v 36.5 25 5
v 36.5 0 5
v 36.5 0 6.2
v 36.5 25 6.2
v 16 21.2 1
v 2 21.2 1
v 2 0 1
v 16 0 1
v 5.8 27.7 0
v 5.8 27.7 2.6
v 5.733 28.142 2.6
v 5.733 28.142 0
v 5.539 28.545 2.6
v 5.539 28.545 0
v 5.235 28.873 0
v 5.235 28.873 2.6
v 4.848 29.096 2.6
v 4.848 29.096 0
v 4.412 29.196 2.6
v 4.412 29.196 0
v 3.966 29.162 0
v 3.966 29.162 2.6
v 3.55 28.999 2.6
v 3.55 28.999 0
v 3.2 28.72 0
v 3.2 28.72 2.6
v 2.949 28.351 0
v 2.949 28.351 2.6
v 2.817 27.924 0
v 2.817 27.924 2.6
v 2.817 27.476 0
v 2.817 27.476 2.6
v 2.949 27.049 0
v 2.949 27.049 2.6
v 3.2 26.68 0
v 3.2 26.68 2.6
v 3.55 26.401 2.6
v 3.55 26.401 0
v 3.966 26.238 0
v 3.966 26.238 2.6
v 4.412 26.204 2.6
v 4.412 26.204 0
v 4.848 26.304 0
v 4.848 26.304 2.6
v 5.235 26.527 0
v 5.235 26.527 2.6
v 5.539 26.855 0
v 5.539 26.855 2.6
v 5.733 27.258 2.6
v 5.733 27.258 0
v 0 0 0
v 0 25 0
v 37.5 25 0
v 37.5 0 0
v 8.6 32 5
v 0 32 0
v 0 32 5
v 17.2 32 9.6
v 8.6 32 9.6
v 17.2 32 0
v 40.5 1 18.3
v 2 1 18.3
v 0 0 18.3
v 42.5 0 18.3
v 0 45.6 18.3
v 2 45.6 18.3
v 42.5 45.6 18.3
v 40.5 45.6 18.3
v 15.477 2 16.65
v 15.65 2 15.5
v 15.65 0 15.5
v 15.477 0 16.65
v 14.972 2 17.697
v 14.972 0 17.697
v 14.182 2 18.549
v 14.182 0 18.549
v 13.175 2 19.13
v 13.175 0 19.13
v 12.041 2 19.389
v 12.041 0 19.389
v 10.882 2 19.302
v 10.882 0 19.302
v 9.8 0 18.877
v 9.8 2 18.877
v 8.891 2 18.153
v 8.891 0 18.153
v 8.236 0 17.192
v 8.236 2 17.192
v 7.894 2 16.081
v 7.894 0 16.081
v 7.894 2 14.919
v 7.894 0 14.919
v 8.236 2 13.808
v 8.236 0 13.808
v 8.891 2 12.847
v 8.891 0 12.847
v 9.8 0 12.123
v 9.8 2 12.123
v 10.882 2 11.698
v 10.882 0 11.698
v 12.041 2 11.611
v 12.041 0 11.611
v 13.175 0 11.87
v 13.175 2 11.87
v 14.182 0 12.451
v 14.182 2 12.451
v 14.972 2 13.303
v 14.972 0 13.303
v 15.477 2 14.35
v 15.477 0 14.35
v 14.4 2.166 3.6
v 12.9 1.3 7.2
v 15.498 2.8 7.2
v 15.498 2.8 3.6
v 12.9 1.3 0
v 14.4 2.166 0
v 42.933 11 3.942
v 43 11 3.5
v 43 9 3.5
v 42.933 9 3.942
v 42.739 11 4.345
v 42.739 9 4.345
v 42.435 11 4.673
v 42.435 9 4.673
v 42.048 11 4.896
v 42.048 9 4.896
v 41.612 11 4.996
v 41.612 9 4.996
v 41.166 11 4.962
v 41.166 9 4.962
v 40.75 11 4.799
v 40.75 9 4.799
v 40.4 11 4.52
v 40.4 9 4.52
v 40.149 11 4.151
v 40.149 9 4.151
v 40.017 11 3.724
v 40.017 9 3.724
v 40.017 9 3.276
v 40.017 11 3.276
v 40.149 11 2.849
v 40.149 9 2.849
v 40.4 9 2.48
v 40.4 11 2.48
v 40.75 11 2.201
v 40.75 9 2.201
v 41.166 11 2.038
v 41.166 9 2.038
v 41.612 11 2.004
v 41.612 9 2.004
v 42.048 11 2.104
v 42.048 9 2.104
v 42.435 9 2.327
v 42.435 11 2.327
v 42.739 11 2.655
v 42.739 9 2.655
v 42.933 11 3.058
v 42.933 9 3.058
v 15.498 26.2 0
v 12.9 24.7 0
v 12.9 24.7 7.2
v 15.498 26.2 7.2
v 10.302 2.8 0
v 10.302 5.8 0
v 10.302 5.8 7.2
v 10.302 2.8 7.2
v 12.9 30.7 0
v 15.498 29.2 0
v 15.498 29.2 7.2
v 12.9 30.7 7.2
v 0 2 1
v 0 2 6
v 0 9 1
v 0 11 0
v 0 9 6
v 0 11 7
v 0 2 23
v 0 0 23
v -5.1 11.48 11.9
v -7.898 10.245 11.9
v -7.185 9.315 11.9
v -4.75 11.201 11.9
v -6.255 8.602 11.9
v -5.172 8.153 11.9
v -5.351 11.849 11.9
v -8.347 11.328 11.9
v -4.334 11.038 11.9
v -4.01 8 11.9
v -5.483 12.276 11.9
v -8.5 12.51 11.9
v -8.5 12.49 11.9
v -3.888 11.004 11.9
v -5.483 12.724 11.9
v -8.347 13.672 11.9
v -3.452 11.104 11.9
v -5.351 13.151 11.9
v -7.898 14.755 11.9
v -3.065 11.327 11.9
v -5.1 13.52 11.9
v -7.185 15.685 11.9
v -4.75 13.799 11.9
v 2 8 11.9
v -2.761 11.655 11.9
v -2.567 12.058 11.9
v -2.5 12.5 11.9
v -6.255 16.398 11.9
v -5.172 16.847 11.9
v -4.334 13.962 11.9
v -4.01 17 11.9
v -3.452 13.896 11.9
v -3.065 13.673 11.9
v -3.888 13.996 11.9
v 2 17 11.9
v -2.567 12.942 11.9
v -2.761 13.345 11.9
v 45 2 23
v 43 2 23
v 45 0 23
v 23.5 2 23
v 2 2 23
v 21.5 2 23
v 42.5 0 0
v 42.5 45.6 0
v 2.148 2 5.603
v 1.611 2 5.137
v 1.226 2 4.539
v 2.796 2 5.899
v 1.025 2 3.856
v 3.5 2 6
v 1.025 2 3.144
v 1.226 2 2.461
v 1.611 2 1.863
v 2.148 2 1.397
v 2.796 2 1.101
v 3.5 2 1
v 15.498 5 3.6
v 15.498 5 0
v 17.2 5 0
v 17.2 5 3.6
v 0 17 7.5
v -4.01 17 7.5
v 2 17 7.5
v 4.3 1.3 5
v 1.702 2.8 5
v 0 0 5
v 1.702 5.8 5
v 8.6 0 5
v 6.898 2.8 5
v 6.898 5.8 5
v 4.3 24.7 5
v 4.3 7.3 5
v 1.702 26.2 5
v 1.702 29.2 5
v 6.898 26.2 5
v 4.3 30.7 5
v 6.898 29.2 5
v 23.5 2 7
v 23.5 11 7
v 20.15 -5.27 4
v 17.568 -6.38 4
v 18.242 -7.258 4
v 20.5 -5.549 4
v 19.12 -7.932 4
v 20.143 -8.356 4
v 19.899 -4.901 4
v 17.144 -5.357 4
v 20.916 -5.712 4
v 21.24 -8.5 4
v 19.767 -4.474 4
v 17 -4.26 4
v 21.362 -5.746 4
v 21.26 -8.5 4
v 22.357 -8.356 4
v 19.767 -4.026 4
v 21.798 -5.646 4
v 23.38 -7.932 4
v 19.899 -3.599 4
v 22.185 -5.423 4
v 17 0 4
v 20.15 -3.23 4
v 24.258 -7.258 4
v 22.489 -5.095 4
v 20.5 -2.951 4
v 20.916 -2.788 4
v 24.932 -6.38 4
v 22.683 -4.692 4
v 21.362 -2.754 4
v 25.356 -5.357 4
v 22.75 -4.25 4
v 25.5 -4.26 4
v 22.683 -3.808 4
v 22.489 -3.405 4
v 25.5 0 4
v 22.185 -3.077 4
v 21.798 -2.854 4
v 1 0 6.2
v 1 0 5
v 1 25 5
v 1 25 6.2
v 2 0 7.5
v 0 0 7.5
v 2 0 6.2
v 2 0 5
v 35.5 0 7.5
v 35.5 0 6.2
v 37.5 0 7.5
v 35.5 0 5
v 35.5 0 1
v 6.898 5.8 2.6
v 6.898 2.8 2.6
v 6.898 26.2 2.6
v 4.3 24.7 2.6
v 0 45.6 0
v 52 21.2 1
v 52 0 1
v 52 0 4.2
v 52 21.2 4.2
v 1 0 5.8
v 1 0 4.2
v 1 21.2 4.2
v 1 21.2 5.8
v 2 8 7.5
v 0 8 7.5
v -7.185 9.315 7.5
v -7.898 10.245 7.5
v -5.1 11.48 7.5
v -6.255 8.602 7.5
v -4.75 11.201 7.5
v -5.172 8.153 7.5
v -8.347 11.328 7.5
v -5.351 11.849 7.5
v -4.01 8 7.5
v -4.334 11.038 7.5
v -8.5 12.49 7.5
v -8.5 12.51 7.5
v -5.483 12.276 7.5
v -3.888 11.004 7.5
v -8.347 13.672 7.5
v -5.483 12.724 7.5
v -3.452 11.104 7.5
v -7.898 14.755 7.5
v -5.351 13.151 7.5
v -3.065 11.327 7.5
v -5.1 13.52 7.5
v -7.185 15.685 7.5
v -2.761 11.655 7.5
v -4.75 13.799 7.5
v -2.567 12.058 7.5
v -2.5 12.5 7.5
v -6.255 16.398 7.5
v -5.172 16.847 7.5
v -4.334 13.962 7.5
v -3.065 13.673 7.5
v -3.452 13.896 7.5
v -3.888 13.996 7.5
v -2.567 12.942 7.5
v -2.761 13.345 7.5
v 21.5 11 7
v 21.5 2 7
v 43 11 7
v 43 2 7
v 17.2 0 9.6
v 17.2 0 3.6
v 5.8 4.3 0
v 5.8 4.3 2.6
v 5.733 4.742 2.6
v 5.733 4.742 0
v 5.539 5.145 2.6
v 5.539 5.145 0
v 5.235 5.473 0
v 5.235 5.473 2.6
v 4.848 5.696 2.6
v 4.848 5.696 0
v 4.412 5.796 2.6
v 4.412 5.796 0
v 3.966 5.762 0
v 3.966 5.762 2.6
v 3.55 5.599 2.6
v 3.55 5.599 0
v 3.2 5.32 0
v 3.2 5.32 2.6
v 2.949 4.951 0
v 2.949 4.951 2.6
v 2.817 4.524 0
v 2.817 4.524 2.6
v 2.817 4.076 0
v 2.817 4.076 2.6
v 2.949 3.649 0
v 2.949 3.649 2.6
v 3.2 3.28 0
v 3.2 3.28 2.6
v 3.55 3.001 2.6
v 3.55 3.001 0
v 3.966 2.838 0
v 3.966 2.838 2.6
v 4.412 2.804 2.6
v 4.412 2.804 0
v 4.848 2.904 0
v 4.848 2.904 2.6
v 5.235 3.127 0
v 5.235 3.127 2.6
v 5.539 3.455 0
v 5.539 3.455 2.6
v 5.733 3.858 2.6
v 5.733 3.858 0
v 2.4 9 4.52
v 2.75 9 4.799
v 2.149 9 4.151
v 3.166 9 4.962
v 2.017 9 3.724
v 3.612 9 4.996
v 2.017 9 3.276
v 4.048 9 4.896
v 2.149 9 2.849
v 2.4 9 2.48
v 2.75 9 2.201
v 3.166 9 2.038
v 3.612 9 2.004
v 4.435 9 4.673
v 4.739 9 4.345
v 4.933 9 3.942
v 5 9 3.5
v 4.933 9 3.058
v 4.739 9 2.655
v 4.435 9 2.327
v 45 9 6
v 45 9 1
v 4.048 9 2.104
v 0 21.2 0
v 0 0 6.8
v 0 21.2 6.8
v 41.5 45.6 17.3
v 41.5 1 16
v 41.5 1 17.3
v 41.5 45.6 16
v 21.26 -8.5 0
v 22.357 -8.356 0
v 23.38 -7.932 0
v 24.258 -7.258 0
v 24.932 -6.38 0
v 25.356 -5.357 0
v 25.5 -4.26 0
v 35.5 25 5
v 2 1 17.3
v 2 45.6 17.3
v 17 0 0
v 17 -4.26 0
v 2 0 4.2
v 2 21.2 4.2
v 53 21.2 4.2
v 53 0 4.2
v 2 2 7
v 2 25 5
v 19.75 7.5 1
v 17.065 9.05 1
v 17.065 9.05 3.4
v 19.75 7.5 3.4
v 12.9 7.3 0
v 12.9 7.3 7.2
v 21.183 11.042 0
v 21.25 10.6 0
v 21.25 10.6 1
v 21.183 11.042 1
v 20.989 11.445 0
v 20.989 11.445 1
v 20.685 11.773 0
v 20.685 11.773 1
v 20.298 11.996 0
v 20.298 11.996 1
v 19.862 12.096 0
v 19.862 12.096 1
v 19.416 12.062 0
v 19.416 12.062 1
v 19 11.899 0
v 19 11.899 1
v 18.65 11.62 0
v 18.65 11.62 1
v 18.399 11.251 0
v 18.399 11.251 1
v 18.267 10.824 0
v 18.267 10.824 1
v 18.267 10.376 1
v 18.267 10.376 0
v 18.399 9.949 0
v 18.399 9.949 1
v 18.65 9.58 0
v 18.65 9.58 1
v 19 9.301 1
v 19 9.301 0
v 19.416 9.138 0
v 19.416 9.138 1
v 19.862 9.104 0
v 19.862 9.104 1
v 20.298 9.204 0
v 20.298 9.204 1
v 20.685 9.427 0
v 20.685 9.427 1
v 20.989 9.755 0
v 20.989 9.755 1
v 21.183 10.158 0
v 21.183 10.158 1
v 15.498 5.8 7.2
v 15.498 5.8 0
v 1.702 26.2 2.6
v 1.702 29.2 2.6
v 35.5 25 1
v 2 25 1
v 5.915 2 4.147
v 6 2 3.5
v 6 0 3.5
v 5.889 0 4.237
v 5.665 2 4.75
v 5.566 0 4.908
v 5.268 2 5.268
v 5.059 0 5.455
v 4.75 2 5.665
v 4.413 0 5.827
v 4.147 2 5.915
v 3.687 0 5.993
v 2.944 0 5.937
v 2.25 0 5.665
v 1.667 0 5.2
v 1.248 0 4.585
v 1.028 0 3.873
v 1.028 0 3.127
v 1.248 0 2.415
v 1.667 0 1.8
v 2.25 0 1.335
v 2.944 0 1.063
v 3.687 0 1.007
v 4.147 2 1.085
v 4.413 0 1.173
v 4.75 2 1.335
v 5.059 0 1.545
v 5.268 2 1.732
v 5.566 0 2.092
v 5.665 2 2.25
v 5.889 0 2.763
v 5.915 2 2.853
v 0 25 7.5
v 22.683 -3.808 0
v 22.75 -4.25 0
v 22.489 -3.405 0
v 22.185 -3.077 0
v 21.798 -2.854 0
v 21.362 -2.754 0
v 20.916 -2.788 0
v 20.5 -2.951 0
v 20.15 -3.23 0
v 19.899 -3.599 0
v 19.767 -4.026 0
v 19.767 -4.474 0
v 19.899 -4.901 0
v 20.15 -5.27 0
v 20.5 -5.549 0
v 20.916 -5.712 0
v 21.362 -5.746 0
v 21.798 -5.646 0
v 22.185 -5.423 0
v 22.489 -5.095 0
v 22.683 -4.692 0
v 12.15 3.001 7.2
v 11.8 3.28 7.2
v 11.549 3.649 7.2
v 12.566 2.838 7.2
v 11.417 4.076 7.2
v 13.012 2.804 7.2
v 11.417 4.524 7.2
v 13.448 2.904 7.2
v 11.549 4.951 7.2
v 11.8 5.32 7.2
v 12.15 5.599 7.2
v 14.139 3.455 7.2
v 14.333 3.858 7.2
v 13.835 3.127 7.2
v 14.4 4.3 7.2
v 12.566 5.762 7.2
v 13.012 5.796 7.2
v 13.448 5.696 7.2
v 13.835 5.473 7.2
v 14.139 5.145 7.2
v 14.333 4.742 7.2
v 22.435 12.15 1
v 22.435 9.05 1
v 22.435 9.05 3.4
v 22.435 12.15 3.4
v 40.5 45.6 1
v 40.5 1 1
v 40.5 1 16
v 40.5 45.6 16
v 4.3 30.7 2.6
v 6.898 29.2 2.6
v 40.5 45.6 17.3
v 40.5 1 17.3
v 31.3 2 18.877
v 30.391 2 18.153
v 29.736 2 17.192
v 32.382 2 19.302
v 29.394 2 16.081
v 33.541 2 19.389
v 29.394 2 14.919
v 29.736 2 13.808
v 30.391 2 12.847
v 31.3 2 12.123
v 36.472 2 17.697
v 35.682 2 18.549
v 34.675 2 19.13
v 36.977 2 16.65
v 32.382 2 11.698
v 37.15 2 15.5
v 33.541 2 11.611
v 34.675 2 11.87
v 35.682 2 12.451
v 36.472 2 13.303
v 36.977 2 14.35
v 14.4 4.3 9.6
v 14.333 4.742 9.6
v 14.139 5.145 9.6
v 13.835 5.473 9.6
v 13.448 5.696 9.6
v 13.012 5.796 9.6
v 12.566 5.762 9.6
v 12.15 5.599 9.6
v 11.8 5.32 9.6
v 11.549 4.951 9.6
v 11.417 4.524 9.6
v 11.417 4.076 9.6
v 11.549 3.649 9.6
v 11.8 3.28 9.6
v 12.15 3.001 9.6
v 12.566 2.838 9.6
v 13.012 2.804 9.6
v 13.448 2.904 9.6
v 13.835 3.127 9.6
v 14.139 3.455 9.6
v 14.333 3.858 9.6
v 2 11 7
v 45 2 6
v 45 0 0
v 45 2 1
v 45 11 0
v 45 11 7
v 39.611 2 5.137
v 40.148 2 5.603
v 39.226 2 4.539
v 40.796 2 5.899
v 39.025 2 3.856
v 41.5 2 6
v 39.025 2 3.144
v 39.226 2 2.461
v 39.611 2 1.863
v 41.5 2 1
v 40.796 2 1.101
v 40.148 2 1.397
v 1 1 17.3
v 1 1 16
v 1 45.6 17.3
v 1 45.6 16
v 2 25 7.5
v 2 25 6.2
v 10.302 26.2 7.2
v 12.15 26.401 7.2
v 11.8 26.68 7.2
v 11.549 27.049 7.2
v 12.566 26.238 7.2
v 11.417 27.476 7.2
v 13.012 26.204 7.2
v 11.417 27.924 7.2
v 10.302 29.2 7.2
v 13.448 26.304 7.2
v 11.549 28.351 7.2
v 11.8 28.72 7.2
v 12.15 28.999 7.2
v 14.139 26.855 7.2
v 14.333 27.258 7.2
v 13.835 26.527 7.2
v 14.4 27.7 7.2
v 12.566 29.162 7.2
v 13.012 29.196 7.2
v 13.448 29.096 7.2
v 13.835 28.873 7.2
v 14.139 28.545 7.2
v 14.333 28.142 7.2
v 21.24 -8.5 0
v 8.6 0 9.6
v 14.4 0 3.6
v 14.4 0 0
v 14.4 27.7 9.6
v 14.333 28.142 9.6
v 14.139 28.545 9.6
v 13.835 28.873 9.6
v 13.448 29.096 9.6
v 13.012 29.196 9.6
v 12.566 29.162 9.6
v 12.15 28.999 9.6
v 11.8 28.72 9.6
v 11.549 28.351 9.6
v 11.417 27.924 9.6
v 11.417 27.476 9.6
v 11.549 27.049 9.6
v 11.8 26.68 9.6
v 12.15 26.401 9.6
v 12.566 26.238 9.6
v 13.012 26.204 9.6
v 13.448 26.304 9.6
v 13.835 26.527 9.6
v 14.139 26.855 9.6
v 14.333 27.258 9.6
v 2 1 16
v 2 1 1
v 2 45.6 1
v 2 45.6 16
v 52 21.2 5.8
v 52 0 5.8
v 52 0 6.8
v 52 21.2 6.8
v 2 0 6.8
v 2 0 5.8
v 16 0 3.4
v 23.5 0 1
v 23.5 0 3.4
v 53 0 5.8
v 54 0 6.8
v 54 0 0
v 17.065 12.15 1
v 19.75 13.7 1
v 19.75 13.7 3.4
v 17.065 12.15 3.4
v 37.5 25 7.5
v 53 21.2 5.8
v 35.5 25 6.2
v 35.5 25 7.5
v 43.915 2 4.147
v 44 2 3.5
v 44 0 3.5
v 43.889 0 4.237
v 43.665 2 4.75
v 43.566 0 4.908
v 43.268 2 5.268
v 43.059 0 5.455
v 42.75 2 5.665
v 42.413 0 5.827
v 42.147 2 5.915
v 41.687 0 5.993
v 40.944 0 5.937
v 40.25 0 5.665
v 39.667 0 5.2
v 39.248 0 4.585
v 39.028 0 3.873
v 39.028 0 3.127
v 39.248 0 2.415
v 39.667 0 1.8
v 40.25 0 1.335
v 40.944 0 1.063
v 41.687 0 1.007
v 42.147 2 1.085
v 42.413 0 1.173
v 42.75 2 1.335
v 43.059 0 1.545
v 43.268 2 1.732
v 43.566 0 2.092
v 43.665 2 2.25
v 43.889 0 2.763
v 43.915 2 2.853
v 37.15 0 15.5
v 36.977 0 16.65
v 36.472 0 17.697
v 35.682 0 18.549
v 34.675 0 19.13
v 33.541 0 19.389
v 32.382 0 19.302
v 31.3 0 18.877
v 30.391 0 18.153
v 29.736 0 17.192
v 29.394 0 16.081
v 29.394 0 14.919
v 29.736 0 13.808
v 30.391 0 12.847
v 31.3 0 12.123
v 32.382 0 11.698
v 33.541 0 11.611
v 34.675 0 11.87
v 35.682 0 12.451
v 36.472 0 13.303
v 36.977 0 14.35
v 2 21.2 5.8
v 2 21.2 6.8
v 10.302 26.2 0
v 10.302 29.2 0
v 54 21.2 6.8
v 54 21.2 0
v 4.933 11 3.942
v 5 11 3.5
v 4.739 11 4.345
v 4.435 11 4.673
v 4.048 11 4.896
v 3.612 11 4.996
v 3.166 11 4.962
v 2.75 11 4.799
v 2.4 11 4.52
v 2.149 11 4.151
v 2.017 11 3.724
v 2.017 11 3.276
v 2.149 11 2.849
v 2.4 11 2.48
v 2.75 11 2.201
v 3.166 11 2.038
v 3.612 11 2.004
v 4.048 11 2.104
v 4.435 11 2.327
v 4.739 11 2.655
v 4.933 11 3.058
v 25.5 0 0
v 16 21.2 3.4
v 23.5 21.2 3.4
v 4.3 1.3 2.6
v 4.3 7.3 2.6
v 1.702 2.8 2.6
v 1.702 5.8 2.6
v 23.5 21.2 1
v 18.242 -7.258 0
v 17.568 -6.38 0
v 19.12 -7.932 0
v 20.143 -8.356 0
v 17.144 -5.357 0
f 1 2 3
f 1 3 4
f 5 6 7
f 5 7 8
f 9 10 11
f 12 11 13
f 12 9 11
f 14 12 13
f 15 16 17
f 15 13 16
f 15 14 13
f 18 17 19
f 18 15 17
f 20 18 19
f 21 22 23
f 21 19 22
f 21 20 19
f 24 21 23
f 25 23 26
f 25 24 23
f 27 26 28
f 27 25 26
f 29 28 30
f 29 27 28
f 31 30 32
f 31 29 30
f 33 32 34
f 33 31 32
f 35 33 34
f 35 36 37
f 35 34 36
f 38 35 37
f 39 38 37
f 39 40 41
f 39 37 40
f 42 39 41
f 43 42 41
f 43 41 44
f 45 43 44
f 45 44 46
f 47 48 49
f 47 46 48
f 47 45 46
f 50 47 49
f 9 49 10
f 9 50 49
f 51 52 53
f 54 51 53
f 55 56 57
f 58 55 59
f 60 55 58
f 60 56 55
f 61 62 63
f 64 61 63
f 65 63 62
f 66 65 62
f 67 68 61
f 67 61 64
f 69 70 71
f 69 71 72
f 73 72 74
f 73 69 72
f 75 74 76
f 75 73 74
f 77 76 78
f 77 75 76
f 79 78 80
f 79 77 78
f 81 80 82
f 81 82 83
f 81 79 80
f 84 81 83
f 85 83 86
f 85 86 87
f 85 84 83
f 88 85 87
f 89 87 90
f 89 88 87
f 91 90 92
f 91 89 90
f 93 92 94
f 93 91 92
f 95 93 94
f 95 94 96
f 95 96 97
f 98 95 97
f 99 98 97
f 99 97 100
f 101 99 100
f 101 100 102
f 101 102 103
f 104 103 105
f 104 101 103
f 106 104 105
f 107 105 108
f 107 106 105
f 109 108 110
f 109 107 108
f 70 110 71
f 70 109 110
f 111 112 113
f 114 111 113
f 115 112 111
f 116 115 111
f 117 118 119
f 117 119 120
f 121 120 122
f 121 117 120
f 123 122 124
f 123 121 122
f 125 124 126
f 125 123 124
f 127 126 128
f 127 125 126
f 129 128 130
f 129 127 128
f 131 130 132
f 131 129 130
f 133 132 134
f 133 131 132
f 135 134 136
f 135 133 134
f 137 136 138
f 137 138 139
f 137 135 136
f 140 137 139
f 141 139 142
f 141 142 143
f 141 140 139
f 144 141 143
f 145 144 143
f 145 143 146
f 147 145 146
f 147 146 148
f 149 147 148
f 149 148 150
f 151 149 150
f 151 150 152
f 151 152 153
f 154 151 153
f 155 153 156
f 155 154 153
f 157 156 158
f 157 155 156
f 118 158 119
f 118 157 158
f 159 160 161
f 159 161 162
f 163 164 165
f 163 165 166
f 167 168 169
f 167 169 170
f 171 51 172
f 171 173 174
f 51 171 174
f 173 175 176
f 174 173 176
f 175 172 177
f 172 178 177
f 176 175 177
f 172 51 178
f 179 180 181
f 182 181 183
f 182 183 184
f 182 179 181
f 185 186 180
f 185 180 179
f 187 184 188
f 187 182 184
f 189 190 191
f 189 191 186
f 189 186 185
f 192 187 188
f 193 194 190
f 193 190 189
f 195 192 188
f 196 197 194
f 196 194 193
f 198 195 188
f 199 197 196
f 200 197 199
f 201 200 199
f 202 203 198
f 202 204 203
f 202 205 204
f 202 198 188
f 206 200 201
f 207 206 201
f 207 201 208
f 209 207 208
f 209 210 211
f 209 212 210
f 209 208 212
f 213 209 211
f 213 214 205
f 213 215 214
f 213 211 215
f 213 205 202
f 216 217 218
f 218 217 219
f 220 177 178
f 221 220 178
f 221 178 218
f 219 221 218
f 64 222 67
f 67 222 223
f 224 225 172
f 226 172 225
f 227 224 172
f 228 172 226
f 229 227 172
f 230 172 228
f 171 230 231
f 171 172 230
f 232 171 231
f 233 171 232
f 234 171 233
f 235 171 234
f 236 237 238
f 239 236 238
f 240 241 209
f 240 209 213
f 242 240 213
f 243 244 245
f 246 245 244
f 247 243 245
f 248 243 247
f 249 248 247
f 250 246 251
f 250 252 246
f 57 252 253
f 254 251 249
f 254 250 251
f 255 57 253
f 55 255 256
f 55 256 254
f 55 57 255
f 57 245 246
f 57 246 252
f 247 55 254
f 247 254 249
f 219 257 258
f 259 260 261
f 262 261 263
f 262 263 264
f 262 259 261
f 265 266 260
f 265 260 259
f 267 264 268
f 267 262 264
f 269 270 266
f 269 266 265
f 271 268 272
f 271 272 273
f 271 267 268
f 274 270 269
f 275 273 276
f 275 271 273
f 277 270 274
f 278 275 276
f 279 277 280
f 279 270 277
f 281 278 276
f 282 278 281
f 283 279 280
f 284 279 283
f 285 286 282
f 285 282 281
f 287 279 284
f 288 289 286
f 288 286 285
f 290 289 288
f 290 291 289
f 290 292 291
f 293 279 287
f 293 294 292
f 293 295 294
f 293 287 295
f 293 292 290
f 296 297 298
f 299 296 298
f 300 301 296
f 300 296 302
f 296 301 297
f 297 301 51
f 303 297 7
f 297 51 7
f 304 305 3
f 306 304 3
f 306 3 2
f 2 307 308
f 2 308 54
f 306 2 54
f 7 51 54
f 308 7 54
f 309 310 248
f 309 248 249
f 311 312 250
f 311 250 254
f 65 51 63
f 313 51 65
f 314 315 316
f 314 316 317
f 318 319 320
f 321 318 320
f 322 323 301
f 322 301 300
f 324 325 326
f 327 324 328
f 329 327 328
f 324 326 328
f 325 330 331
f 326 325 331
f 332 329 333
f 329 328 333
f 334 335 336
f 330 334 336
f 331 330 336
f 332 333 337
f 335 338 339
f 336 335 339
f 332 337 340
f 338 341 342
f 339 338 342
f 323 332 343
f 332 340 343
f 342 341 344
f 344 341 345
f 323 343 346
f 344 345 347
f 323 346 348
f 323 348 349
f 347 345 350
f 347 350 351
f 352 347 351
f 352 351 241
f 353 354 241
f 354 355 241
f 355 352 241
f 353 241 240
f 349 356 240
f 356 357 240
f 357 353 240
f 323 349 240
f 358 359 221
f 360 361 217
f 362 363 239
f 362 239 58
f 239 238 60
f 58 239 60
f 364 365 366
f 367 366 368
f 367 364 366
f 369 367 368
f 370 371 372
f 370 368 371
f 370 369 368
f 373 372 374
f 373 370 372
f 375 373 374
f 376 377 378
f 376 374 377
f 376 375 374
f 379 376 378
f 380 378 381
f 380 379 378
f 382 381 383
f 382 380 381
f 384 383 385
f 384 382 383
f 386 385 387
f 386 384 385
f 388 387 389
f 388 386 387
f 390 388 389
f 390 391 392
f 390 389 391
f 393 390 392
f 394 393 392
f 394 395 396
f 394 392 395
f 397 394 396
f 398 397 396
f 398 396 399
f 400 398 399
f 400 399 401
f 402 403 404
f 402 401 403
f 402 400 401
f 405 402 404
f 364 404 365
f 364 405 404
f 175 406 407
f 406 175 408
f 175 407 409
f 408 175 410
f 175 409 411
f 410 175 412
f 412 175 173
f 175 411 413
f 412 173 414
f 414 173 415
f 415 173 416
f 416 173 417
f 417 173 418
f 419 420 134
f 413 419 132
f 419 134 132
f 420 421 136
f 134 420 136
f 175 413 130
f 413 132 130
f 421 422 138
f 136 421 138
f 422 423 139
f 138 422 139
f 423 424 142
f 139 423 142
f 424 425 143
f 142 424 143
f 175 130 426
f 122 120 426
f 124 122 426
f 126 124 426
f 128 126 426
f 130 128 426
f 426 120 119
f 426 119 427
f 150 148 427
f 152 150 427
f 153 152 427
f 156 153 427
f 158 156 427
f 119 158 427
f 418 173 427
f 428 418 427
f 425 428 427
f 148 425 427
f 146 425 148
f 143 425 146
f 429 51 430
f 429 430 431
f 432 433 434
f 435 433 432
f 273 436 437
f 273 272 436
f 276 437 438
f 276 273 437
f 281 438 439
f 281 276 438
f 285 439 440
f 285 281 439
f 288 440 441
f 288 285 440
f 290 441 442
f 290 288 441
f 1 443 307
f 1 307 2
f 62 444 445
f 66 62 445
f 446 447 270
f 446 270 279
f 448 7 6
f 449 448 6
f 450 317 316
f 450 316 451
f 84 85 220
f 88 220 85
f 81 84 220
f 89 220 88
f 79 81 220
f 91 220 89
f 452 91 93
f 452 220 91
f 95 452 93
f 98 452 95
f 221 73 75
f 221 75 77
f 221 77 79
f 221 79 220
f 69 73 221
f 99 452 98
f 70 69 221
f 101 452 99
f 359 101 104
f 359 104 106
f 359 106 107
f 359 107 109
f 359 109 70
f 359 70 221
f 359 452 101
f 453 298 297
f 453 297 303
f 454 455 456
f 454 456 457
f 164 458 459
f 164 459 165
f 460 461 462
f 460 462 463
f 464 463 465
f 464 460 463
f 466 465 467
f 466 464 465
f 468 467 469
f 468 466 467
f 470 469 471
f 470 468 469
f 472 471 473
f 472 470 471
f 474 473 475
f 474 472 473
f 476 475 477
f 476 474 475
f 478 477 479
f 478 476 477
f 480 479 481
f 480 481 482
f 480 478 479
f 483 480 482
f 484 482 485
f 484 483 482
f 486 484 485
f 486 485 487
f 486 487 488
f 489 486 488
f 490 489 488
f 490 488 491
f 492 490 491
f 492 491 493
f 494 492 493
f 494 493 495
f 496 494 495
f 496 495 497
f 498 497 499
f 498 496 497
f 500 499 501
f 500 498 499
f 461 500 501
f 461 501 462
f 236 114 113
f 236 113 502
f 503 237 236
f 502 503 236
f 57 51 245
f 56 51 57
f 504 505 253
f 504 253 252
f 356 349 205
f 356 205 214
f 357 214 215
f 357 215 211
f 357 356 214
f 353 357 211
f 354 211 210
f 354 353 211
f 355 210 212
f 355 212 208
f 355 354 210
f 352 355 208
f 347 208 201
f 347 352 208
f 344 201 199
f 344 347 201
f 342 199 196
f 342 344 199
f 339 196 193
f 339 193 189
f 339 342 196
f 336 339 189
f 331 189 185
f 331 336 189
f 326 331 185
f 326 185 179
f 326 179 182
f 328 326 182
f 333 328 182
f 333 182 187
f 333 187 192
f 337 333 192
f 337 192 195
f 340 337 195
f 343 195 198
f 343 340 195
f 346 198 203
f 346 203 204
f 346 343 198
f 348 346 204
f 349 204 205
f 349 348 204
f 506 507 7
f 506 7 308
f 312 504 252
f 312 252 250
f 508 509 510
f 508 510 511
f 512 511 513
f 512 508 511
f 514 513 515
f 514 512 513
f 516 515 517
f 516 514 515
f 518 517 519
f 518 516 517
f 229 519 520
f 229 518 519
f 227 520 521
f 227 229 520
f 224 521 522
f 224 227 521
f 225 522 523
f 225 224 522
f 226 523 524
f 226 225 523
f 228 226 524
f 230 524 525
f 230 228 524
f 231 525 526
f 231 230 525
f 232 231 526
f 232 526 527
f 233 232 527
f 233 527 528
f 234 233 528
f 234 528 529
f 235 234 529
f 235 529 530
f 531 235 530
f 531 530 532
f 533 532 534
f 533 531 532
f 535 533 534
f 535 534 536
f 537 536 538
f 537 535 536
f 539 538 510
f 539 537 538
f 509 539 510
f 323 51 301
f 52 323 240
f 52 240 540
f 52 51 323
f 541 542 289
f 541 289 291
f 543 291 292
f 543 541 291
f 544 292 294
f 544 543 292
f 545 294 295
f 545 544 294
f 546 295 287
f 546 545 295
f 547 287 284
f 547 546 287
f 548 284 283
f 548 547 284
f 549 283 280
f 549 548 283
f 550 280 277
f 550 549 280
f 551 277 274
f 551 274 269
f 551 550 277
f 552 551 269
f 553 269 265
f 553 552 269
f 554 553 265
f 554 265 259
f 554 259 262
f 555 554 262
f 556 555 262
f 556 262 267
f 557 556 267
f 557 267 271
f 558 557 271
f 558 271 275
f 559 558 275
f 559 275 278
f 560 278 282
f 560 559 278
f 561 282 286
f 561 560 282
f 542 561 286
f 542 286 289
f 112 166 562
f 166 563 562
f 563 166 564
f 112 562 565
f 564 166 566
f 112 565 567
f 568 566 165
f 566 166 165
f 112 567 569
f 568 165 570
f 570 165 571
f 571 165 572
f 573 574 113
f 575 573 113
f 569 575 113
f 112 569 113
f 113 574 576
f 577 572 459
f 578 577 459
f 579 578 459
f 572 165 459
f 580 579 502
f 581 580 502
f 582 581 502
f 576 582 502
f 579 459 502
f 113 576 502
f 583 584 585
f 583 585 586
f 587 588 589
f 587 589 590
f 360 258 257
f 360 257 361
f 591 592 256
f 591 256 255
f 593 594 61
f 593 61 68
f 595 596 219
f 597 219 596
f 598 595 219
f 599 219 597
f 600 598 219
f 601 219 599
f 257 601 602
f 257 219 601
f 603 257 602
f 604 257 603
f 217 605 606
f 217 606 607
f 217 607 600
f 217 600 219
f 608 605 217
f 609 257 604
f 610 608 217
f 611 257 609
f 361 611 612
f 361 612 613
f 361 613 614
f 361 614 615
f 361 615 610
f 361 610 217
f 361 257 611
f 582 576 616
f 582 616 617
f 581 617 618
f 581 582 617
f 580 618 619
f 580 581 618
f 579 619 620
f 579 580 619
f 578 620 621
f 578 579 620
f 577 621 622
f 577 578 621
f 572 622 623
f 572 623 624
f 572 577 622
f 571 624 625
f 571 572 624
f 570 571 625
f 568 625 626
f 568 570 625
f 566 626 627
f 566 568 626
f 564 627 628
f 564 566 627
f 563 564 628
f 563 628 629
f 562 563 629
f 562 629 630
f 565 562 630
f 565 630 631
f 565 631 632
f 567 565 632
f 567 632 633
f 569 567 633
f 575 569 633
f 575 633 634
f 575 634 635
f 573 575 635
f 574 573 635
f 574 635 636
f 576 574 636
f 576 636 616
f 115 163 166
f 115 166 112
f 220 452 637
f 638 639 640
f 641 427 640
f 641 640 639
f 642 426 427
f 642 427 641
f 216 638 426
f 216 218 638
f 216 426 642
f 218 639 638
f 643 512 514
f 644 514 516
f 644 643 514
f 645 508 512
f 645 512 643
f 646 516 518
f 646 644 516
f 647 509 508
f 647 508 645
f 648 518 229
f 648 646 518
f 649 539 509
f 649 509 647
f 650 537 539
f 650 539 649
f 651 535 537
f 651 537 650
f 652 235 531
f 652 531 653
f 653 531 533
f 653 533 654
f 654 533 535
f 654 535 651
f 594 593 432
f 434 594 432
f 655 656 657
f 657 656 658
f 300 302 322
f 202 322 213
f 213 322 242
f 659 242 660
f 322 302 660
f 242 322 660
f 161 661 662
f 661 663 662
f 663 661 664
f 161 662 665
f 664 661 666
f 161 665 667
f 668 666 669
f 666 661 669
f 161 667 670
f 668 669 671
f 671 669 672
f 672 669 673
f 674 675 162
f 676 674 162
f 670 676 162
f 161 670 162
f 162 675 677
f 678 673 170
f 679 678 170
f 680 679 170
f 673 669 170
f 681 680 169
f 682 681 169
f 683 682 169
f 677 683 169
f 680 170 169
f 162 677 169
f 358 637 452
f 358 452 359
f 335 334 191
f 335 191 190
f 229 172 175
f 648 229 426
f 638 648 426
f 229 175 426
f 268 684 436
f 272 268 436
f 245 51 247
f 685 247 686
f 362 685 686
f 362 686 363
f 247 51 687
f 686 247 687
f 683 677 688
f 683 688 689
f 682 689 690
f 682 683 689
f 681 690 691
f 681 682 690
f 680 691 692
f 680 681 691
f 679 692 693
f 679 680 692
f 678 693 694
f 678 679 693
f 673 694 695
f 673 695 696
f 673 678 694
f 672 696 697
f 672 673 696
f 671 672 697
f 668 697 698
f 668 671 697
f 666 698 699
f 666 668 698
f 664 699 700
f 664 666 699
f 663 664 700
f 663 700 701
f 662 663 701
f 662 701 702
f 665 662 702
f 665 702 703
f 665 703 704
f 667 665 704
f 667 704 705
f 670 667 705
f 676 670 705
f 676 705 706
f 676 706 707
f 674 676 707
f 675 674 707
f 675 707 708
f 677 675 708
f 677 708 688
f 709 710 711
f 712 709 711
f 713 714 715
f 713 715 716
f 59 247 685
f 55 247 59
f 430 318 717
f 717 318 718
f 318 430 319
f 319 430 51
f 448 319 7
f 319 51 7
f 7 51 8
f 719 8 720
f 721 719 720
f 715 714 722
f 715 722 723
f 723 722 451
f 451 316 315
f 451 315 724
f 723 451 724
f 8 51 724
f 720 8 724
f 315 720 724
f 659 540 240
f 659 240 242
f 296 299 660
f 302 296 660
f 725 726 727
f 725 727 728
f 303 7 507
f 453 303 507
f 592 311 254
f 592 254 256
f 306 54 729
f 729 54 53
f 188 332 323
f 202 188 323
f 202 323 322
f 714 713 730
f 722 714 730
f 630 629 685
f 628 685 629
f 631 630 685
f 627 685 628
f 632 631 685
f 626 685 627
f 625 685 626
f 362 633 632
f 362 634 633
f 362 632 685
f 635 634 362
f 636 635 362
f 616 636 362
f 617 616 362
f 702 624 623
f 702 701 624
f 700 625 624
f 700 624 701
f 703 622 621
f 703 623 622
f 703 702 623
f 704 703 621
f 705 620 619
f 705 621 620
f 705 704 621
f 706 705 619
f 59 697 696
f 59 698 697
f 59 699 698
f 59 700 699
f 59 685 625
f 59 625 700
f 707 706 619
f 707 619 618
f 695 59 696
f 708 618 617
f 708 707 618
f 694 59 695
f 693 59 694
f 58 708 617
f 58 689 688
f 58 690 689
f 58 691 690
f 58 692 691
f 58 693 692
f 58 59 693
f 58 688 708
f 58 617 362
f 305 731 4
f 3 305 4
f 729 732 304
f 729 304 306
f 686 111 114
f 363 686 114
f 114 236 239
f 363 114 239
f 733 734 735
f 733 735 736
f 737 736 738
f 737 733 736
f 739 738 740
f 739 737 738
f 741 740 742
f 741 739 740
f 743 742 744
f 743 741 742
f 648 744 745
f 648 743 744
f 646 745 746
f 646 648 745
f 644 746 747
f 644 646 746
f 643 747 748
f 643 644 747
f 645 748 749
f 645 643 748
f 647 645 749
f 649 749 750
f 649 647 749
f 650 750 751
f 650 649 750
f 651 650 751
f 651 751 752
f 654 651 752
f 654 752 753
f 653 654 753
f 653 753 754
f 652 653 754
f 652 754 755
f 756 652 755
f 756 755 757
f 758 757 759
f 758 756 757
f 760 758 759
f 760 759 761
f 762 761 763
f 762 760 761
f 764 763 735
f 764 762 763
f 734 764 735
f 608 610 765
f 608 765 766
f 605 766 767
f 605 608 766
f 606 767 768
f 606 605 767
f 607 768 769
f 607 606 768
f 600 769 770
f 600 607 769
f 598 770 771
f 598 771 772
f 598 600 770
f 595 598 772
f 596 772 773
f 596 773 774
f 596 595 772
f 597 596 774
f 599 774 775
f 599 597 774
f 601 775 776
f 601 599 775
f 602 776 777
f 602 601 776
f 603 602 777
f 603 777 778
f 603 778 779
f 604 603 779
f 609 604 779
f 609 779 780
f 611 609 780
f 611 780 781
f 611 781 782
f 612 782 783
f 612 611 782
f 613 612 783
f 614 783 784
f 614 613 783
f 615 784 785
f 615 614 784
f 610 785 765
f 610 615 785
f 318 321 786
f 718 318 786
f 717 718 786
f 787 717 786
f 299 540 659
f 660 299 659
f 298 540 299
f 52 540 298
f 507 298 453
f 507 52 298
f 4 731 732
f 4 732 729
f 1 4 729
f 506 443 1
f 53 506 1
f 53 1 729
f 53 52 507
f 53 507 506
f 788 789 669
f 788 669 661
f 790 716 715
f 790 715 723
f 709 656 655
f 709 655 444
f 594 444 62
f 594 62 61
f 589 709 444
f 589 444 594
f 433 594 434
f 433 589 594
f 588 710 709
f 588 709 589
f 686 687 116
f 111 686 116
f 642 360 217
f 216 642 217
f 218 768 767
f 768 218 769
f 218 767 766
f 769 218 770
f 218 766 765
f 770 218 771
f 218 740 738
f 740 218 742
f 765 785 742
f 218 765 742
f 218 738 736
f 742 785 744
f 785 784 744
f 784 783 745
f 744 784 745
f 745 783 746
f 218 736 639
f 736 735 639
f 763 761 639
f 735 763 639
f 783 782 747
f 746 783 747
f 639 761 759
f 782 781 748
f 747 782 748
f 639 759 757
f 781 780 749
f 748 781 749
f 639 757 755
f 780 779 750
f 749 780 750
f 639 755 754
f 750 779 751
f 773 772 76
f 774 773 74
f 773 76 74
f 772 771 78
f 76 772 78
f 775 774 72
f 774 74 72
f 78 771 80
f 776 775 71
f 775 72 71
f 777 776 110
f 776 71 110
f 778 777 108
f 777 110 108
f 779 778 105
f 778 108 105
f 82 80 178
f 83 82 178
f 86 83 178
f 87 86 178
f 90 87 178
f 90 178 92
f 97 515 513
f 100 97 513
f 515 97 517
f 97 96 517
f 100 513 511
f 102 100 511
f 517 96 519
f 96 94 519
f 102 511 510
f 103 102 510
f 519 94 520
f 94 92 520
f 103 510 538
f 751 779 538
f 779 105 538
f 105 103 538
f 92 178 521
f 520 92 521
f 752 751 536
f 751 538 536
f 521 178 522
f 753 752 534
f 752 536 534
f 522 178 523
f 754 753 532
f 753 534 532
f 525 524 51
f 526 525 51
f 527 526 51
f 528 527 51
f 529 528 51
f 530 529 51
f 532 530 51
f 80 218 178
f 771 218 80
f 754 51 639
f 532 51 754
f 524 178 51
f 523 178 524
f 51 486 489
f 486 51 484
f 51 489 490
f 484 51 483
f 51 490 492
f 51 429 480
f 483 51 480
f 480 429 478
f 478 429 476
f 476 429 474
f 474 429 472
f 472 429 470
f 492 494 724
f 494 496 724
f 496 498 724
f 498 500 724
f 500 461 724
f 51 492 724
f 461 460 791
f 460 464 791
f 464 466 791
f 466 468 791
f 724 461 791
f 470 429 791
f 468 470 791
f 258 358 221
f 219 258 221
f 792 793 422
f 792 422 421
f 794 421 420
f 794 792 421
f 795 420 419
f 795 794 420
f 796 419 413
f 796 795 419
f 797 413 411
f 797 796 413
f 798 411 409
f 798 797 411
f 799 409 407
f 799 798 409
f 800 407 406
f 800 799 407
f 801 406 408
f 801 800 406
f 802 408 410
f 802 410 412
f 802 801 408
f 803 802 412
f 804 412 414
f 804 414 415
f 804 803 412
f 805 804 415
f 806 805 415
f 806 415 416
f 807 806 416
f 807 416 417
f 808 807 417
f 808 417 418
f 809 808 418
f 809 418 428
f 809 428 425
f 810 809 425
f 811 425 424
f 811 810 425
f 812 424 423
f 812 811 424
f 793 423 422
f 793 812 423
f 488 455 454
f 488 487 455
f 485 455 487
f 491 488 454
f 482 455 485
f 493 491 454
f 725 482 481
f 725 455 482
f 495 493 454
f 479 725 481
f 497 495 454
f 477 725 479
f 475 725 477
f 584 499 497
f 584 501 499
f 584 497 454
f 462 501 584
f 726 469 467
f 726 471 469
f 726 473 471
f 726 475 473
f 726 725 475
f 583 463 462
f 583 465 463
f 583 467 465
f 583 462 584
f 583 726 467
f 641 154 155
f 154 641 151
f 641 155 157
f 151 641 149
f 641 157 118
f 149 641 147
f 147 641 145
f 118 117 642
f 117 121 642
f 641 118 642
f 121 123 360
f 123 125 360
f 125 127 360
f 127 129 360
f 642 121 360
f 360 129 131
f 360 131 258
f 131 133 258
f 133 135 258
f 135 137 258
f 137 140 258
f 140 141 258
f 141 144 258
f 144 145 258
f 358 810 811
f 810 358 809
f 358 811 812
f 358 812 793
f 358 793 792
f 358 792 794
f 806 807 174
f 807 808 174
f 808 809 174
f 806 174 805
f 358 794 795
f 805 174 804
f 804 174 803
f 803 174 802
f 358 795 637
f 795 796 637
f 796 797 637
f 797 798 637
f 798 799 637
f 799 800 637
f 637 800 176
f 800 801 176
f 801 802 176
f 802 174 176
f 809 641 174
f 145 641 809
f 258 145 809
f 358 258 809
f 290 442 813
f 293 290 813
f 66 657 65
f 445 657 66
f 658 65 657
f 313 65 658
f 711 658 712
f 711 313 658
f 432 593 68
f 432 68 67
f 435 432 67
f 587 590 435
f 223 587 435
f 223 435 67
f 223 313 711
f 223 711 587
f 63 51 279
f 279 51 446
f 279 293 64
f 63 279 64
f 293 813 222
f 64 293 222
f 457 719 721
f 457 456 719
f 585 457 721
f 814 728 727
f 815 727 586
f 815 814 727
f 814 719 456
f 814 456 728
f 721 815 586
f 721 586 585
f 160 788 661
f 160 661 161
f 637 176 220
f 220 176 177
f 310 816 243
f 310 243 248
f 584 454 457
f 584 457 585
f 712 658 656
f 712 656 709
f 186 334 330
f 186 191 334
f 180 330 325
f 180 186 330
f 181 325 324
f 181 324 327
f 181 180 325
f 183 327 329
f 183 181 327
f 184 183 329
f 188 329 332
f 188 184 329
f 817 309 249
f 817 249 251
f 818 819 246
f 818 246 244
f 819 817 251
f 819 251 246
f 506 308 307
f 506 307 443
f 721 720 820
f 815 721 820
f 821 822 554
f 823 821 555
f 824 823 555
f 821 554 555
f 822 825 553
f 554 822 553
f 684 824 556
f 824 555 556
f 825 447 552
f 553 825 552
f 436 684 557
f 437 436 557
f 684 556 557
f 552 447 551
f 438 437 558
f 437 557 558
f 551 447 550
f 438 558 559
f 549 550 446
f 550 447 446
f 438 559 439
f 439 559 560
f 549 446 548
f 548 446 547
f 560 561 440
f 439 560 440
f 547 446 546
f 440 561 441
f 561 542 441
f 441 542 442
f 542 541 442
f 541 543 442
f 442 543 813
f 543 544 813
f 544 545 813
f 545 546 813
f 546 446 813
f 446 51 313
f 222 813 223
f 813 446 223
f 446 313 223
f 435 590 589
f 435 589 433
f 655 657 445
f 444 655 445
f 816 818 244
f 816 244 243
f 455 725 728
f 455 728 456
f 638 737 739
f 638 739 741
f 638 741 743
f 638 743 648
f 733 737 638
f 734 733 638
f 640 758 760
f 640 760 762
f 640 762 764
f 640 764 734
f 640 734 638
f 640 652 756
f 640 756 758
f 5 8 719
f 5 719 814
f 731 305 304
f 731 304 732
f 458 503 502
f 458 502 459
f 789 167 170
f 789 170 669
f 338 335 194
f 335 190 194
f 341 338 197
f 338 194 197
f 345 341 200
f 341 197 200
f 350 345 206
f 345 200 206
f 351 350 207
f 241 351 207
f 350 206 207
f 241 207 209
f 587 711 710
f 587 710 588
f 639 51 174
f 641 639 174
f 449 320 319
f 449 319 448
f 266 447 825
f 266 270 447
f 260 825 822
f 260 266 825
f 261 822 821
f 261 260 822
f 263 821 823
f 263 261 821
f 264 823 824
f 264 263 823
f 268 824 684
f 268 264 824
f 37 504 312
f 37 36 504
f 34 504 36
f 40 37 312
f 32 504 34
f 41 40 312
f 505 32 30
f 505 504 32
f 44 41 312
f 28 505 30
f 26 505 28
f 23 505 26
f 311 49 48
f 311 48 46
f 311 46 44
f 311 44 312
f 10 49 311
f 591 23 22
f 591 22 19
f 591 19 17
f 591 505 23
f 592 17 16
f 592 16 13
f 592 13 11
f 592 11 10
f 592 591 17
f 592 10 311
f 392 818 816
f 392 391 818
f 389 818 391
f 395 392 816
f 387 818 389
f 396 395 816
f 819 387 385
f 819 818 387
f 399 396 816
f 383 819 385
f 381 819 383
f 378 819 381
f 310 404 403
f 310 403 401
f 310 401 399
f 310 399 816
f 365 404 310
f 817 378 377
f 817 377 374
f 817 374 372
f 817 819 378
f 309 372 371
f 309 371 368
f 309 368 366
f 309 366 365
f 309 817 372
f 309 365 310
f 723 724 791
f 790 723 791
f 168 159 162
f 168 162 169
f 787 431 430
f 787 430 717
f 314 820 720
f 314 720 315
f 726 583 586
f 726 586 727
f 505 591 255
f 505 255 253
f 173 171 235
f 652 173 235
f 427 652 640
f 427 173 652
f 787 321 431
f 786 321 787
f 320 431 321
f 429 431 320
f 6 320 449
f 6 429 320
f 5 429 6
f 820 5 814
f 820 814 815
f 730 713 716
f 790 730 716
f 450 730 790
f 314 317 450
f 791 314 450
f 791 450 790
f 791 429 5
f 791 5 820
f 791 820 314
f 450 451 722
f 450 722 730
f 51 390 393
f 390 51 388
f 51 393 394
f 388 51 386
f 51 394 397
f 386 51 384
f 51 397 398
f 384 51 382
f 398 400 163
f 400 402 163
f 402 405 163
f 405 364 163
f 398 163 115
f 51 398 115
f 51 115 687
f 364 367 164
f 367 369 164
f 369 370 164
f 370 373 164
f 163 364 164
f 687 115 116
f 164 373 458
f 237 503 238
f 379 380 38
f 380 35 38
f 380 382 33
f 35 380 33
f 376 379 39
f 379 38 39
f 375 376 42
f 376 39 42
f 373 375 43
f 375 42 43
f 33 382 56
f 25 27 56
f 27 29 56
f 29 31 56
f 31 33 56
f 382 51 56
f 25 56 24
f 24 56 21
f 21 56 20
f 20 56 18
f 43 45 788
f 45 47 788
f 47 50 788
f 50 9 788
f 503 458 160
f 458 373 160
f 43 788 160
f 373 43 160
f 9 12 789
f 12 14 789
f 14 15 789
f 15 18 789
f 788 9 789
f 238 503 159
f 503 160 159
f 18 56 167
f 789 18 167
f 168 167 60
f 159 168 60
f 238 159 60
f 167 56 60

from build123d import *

# Parameters (mm, degrees)
PAD003_DEPTH      = 7.2
PAD002_DEPTH      = 7.2
PAD001_DEPTH      = 2.4
PAD_DEPTH         = 2.4
CYLINDER003_R     = 1.5
CYLINDER003_DEPTH = 5
CYLINDER002_R     = 1.5
CYLINDER002_DEPTH = 5
CYLINDER001_R     = 1.5
CYLINDER001_DEPTH = 9.6
CYLINDER_R        = 1.5
CYLINDER_DEPTH    = 9.6
BOX002_W          = 8.6
BOX002_H          = 32
BOX002_DEPTH      = 4.6
BOX001_W          = 2.8
BOX001_H          = 5
BOX001_DEPTH      = 3.6
BOX_W             = 17.2
BOX_H             = 32
BOX_DEPTH         = 9.6
CYLINDER004_R     = 1.5
CYLINDER004_DEPTH = 4.4
BOX006_W          = 10.5
BOX006_H          = 9
BOX006_DEPTH      = 4.4
FILLET_R          = 4.49
BOX005_W          = 35.5
BOX005_H          = 25
BOX005_DEPTH      = 1.2
BOX003_W          = 33.5
BOX003_H          = 25
BOX003_DEPTH      = 6.5
BOX004_W          = 37.5
BOX004_H          = 25
BOX004_DEPTH      = 7.5
CYLINDER005_R     = 1.5
CYLINDER005_DEPTH = 1
PAD004_DEPTH      = 2.4
BOX010_W          = 7.5
BOX010_H          = 21.2
BOX010_DEPTH      = 2.4
BOX009_W          = 52
BOX009_H          = 21.2
BOX009_DEPTH      = 1.6
BOX008_W          = 50
BOX008_H          = 21.2
BOX008_DEPTH      = 5.8
BOX007_W          = 54
BOX007_H          = 21.2
BOX007_DEPTH      = 6.8
CYLINDER011_R     = 3.9
CYLINDER011_DEPTH = 2
CYLINDER010_R     = 3.9
CYLINDER010_DEPTH = 2
CYLINDER009_R     = 1.5
CYLINDER009_DEPTH = 2
CYLINDER008_R     = 2.5
CYLINDER008_DEPTH = 2
CYLINDER007_R     = 1.5
CYLINDER007_DEPTH = 2
CYLINDER006_R     = 2.5
CYLINDER006_DEPTH = 2
BOX013_W          = 19.5
BOX013_H          = 9
BOX013_DEPTH      = 16
BOX012_W          = 19.5
BOX012_H          = 9
BOX012_DEPTH      = 16
BOX011_W          = 45
BOX011_H          = 7
BOX011_DEPTH      = 5
PAD005_DEPTH      = 45
CYLINDER012_R     = 1.5
CYLINDER012_DEPTH = 4
BOX017_W          = 8.5
BOX017_H          = 8.5
BOX017_DEPTH      = 4
FILLET001_R       = 4.24
BOX016_W          = 40.5
BOX016_H          = 44.6
BOX016_DEPTH      = 1.3
BOX015_W          = 38.5
BOX015_H          = 44.6
BOX015_DEPTH      = 18.3
BOX014_W          = 42.5
BOX014_H          = 45.6
BOX014_DEPTH      = 18.3


with BuildPart() as nut_hole003:
    # Sketch003 → Pad003 (new body)
    with BuildSketch(Plane.XY):
        Polygon((0, 3), (-2.598076, 1.5), (-2.598076, -1.5), (0, -3), (2.598076, -1.5), (2.598076, 1.5), align=None)
    extrude(amount=PAD003_DEPTH)


with BuildPart() as nut_hole003_1:
    # Body003 placement: moved
    add(nut_hole003.part.moved(Location((12.9, 4.3, 0))))


with BuildPart() as nut_hole002:
    # Sketch002 → Pad002 (new body)
    with BuildSketch(Plane.XY):
        Polygon((0, 3), (-2.598076, 1.5), (-2.598076, -1.5), (0, -3), (2.598076, -1.5), (2.598076, 1.5), align=None)
    extrude(amount=PAD002_DEPTH)


with BuildPart() as nut_hole002_1:
    # Body002 placement: moved
    add(nut_hole002.part.moved(Location((12.9, 27.7, 0))))


with BuildPart() as nut_hole001:
    # Sketch001 → Pad001 (new body)
    with BuildSketch(Plane.XY):
        Polygon((0, 3), (-2.598076, 1.5), (-2.598076, -1.5), (0, -3), (2.598076, -1.5), (2.598076, 1.5), align=None)
    extrude(amount=PAD001_DEPTH)


with BuildPart() as nut_hole001_1:
    # Body001 placement: moved
    add(nut_hole001.part.moved(Location((4.3, 27.7, 2.6))))


with BuildPart() as nut_hole:
    # Sketch → Pad (new body)
    with BuildSketch(Plane.XY):
        Polygon((0, 3), (-2.598076, 1.5), (-2.598076, -1.5), (0, -3), (2.598076, -1.5), (2.598076, 1.5), align=None)
    extrude(amount=PAD_DEPTH)


with BuildPart() as nut_hole_1:
    # Body placement: moved
    add(nut_hole.part.moved(Location((4.3, 4.3, 2.6))))


with BuildPart() as screw_hole003:
    # Cylinder003 → Cylinder003 (new body)
    with BuildSketch(Plane(origin=(4.3, 27.7, 0), x_dir=(1, 0, 0), z_dir=(0, 0, 1))):
        Circle(CYLINDER003_R)
    extrude(amount=CYLINDER003_DEPTH)


with BuildPart() as screw_hole002:
    # Cylinder002 → Cylinder002 (new body)
    with BuildSketch(Plane(origin=(4.3, 4.3, 0), x_dir=(1, 0, 0), z_dir=(0, 0, 1))):
        Circle(CYLINDER002_R)
    extrude(amount=CYLINDER002_DEPTH)


with BuildPart() as screw_hole001:
    # Cylinder001 → Cylinder001 (new body)
    with BuildSketch(Plane(origin=(12.9, 27.7, 0), x_dir=(1, 0, 0), z_dir=(0, 0, 1))):
        Circle(CYLINDER001_R)
    extrude(amount=CYLINDER001_DEPTH)


with BuildPart() as screw_hole:
    # Cylinder → Cylinder (new body)
    with BuildSketch(Plane(origin=(12.9, 4.3, 0), x_dir=(1, 0, 0), z_dir=(0, 0, 1))):
        Circle(CYLINDER_R)
    extrude(amount=CYLINDER_DEPTH)


with BuildPart() as hole:
    # Box002 → Box002 (new body)
    with BuildSketch(Plane.XY.offset(5)):
        with Locations((4.3, 16)):
            Rectangle(BOX002_W, BOX002_H)
    extrude(amount=BOX002_DEPTH)


with BuildPart() as corner_hole:
    # Box001 → Box001 (new body)
    with BuildSketch(Plane(origin=(14.4, 0, 0), x_dir=(1, 0, 0), z_dir=(0, 0, 1))):
        with Locations((1.4, 2.5)):
            Rectangle(BOX001_W, BOX001_H)
    extrude(amount=BOX001_DEPTH)


with BuildPart() as right_support:
    # Box → Box (new body)
    with BuildSketch(Plane.XY):
        with Locations((8.6, 16)):
            Rectangle(BOX_W, BOX_H)
    extrude(amount=BOX_DEPTH)

    # Cut: cut corner_hole
    add(corner_hole.part, mode=Mode.SUBTRACT)

    # Cut001: cut hole
    add(hole.part, mode=Mode.SUBTRACT)

    # Cut002: cut screw_hole
    add(screw_hole.part, mode=Mode.SUBTRACT)

    # Cut003: cut screw_hole001
    add(screw_hole001.part, mode=Mode.SUBTRACT)

    # Cut004: cut screw_hole002
    add(screw_hole002.part, mode=Mode.SUBTRACT)

    # Cut005: cut screw_hole003
    add(screw_hole003.part, mode=Mode.SUBTRACT)

    # Cut006: cut nut_hole
    add(nut_hole_1.part, mode=Mode.SUBTRACT)

    # Cut007: cut nut_hole001
    add(nut_hole001_1.part, mode=Mode.SUBTRACT)

    # Cut008: cut nut_hole002
    add(nut_hole002_1.part, mode=Mode.SUBTRACT)

    # Cut009: cut nut_hole003
    add(nut_hole003_1.part, mode=Mode.SUBTRACT)


with BuildPart() as screw_hole004:
    # Cylinder004 → Cylinder004 (new body)
    with BuildSketch(Plane(origin=(-4, 12.5, 7.5), x_dir=(1, 0, 0), z_dir=(0, 0, 1))):
        Circle(CYLINDER004_R)
    extrude(amount=CYLINDER004_DEPTH)


with BuildPart() as support001:
    # Box006 → Box006 (new body)
    with BuildSketch(Plane(origin=(-8.5, 8, 7.5), x_dir=(1, 0, 0), z_dir=(0, 0, 1))):
        with Locations((5.25, 4.5)):
            Rectangle(BOX006_W, BOX006_H)
    extrude(amount=BOX006_DEPTH)

    # Fillet
    fillet_edges = [support001.edges().sort_by_distance(p)[0] for p in [
        (-8.5, 8, 9.7),
        (-8.5, 17, 9.7),
    ]]
    fillet(fillet_edges, radius=FILLET_R)

    # Cut012: cut screw_hole004
    add(screw_hole004.part, mode=Mode.SUBTRACT)


with BuildPart() as hole002:
    # Box005 → Box005 (new body)
    with BuildSketch(Plane(origin=(1, 0, 5), x_dir=(1, 0, 0), z_dir=(0, 0, 1))):
        with Locations((17.75, 12.5)):
            Rectangle(BOX005_W, BOX005_H)
    extrude(amount=BOX005_DEPTH)


with BuildPart() as hole001:
    # Box003 → Box003 (new body)
    with BuildSketch(Plane(origin=(2, 0, 1), x_dir=(1, 0, 0), z_dir=(0, 0, 1))):
        with Locations((16.75, 12.5)):
            Rectangle(BOX003_W, BOX003_H)
    extrude(amount=BOX003_DEPTH)


with BuildPart() as power_supply_support:
    # Box004 → Box004 (new body)
    with BuildSketch(Plane.XY):
        with Locations((18.75, 12.5)):
            Rectangle(BOX004_W, BOX004_H)
    extrude(amount=BOX004_DEPTH)

    # Cut010: cut hole001
    add(hole001.part, mode=Mode.SUBTRACT)

    # Cut011: cut hole002
    add(hole002.part, mode=Mode.SUBTRACT)

    # Fusion: union support001
    add(support001.part)


with BuildPart() as screw_hole005:
    # Cylinder005 → Cylinder005 (new body)
    with BuildSketch(Plane(origin=(19.75, 10.6, 0), x_dir=(1, 0, 0), z_dir=(0, 0, 1))):
        Circle(CYLINDER005_R)
    extrude(amount=CYLINDER005_DEPTH)


with BuildPart() as nut_hole004:
    # Sketch004 → Pad004 (new body)
    with BuildSketch(Plane.XY):
        Polygon((0, 3.1), (-2.684679, 1.55), (-2.684679, -1.55), (0, -3.1), (2.684679, -1.55), (2.684679, 1.55), align=None)
    extrude(amount=PAD004_DEPTH)


with BuildPart() as nut_hole004_1:
    # Body004 placement: moved
    add(nut_hole004.part.moved(Location((19.75, 10.6, 1))))


with BuildPart() as nut_support:
    # Box010 → Box010 (new body)
    with BuildSketch(Plane(origin=(16, 0, 1), x_dir=(1, 0, 0), z_dir=(0, 0, 1))):
        with Locations((3.75, 10.6)):
            Rectangle(BOX010_W, BOX010_H)
    extrude(amount=BOX010_DEPTH)


with BuildPart() as hole004:
    # Box009 → Box009 (new body)
    with BuildSketch(Plane(origin=(1, 0, 4.2), x_dir=(1, 0, 0), z_dir=(0, 0, 1))):
        with Locations((26, 10.6)):
            Rectangle(BOX009_W, BOX009_H)
    extrude(amount=BOX009_DEPTH)


with BuildPart() as hole003:
    # Box008 → Box008 (new body)
    with BuildSketch(Plane(origin=(2, 0, 1), x_dir=(1, 0, 0), z_dir=(0, 0, 1))):
        with Locations((25, 10.6)):
            Rectangle(BOX008_W, BOX008_H)
    extrude(amount=BOX008_DEPTH)


with BuildPart() as voltage_sensor_support:
    # Box007 → Box007 (new body)
    with BuildSketch(Plane.XY):
        with Locations((27, 10.6)):
            Rectangle(BOX007_W, BOX007_H)
    extrude(amount=BOX007_DEPTH)

    # Cut013: cut hole003
    add(hole003.part, mode=Mode.SUBTRACT)

    # Cut014: cut hole004
    add(hole004.part, mode=Mode.SUBTRACT)

    # Fusion001: union nut_support
    add(nut_support.part)

    # Cut015: cut nut_hole004
    add(nut_hole004_1.part, mode=Mode.SUBTRACT)

    # Cut016: cut screw_hole005
    add(screw_hole005.part, mode=Mode.SUBTRACT)


with BuildPart() as screw_hole011:
    # Cylinder011 → Cylinder011 (new body)
    with BuildSketch(Plane(origin=(33.25, 2, 15.5), x_dir=(1, 0, 0), z_dir=(0, -1, 0))):
        Circle(CYLINDER011_R)
    extrude(amount=CYLINDER011_DEPTH)


with BuildPart() as screw_hole010:
    # Cylinder010 → Cylinder010 (new body)
    with BuildSketch(Plane(origin=(11.75, 2, 15.5), x_dir=(1, 0, 0), z_dir=(0, -1, 0))):
        Circle(CYLINDER010_R)
    extrude(amount=CYLINDER010_DEPTH)


with BuildPart() as screw_hole009:
    # Cylinder009 → Cylinder009 (new body)
    with BuildSketch(Plane(origin=(41.5, 11, 3.5), x_dir=(1, 0, 0), z_dir=(0, -1, 0))):
        Circle(CYLINDER009_R)
    extrude(amount=CYLINDER009_DEPTH)


with BuildPart() as screw_hole008:
    # Cylinder008 → Cylinder008 (new body)
    with BuildSketch(Plane(origin=(3.5, 2, 3.5), x_dir=(1, 0, 0), z_dir=(0, -1, 0))):
        Circle(CYLINDER008_R)
    extrude(amount=CYLINDER008_DEPTH)


with BuildPart() as screw_hole007:
    # Cylinder007 → Cylinder007 (new body)
    with BuildSketch(Plane(origin=(3.5, 11, 3.5), x_dir=(1, 0, 0), z_dir=(0, -1, 0))):
        Circle(CYLINDER007_R)
    extrude(amount=CYLINDER007_DEPTH)


with BuildPart() as screw_hole006:
    # Cylinder006 → Cylinder006 (new body)
    with BuildSketch(Plane(origin=(41.5, 2, 3.5), x_dir=(1, 0, 0), z_dir=(0, -1, 0))):
        Circle(CYLINDER006_R)
    extrude(amount=CYLINDER006_DEPTH)


with BuildPart() as hole007:
    # Box013 → Box013 (new body)
    with BuildSketch(Plane(origin=(2, 2, 7), x_dir=(1, 0, 0), z_dir=(0, 0, 1))):
        with Locations((9.75, 4.5)):
            Rectangle(BOX013_W, BOX013_H)
    extrude(amount=BOX013_DEPTH)


with BuildPart() as hole006:
    # Box012 → Box012 (new body)
    with BuildSketch(Plane(origin=(23.5, 2, 7), x_dir=(1, 0, 0), z_dir=(0, 0, 1))):
        with Locations((9.75, 4.5)):
            Rectangle(BOX012_W, BOX012_H)
    extrude(amount=BOX012_DEPTH)


with BuildPart() as hole005:
    # Box011 → Box011 (new body)
    with BuildSketch(Plane(origin=(0, 2, 1), x_dir=(1, 0, 0), z_dir=(0, 0, 1))):
        with Locations((22.5, 3.5)):
            Rectangle(BOX011_W, BOX011_H)
    extrude(amount=BOX011_DEPTH)


with BuildPart() as wires_support:
    # Sketch005 → Pad005 (new body)
    with BuildSketch(Plane.YZ):
        Polygon((0, 0), (11, 0), (11, 7), (2, 23), (0, 23), align=None)
    extrude(amount=PAD005_DEPTH)

    # Cut017: cut hole005
    add(hole005.part, mode=Mode.SUBTRACT)

    # Cut018: cut hole006
    add(hole006.part, mode=Mode.SUBTRACT)

    # Cut019: cut hole007
    add(hole007.part, mode=Mode.SUBTRACT)

    # Cut020: cut screw_hole006
    add(screw_hole006.part, mode=Mode.SUBTRACT)

    # Cut021: cut screw_hole007
    add(screw_hole007.part, mode=Mode.SUBTRACT)

    # Cut022: cut screw_hole008
    add(screw_hole008.part, mode=Mode.SUBTRACT)

    # Cut023: cut screw_hole009
    add(screw_hole009.part, mode=Mode.SUBTRACT)

    # Cut024: cut screw_hole010
    add(screw_hole010.part, mode=Mode.SUBTRACT)

    # Cut025: cut screw_hole011
    add(screw_hole011.part, mode=Mode.SUBTRACT)


with BuildPart() as screw_hole012:
    # Cylinder012 → Cylinder012 (new body)
    with BuildSketch(Plane(origin=(4.25, 4.25, 0), x_dir=(1, 0, 0), z_dir=(0, 0, 1))):
        Circle(CYLINDER012_R)
    extrude(amount=CYLINDER012_DEPTH)


with BuildPart() as support004:
    # Box017 → Box017 (new body)
    with BuildSketch(Plane.XY):
        with Locations((4.25, 4.25)):
            Rectangle(BOX017_W, BOX017_H)
    extrude(amount=BOX017_DEPTH)

    # Cut028: cut screw_hole012
    add(screw_hole012.part, mode=Mode.SUBTRACT)

    # Fillet001
    fillet001_edges = [support004.edges().sort_by_distance(p)[0] for p in [
        (0, 0, 2),
        (8.5, 0, 2),
    ]]
    fillet(fillet001_edges, radius=FILLET001_R)


with BuildPart() as support004_1:
    # Fillet001 placement: moved
    add(support004.part.moved(Location((17, -8.5, 0))))


with BuildPart() as pdb_hole:
    # Box016 → Box016 (new body)
    with BuildSketch(Plane(origin=(1, 1, 16), x_dir=(1, 0, 0), z_dir=(0, 0, 1))):
        with Locations((20.25, 22.3)):
            Rectangle(BOX016_W, BOX016_H)
    extrude(amount=BOX016_DEPTH)


with BuildPart() as hole008:
    # Box015 → Box015 (new body)
    with BuildSketch(Plane(origin=(2, 1, 1), x_dir=(1, 0, 0), z_dir=(0, 0, 1))):
        with Locations((19.25, 22.3)):
            Rectangle(BOX015_W, BOX015_H)
    extrude(amount=BOX015_DEPTH)


with BuildPart() as power_supply_support_v2:
    # Box014 → Box014 (new body)
    with BuildSketch(Plane.XY):
        with Locations((21.25, 22.8)):
            Rectangle(BOX014_W, BOX014_H)
    extrude(amount=BOX014_DEPTH)

    # Cut026: cut hole008
    add(hole008.part, mode=Mode.SUBTRACT)

    # Cut027: cut pdb_hole
    add(pdb_hole.part, mode=Mode.SUBTRACT)

    # Fusion002: union support004
    add(support004_1.part)


solid = Compound([right_support.part, power_supply_support.part, voltage_sensor_support.part, wires_support.part, power_supply_support_v2.part])
